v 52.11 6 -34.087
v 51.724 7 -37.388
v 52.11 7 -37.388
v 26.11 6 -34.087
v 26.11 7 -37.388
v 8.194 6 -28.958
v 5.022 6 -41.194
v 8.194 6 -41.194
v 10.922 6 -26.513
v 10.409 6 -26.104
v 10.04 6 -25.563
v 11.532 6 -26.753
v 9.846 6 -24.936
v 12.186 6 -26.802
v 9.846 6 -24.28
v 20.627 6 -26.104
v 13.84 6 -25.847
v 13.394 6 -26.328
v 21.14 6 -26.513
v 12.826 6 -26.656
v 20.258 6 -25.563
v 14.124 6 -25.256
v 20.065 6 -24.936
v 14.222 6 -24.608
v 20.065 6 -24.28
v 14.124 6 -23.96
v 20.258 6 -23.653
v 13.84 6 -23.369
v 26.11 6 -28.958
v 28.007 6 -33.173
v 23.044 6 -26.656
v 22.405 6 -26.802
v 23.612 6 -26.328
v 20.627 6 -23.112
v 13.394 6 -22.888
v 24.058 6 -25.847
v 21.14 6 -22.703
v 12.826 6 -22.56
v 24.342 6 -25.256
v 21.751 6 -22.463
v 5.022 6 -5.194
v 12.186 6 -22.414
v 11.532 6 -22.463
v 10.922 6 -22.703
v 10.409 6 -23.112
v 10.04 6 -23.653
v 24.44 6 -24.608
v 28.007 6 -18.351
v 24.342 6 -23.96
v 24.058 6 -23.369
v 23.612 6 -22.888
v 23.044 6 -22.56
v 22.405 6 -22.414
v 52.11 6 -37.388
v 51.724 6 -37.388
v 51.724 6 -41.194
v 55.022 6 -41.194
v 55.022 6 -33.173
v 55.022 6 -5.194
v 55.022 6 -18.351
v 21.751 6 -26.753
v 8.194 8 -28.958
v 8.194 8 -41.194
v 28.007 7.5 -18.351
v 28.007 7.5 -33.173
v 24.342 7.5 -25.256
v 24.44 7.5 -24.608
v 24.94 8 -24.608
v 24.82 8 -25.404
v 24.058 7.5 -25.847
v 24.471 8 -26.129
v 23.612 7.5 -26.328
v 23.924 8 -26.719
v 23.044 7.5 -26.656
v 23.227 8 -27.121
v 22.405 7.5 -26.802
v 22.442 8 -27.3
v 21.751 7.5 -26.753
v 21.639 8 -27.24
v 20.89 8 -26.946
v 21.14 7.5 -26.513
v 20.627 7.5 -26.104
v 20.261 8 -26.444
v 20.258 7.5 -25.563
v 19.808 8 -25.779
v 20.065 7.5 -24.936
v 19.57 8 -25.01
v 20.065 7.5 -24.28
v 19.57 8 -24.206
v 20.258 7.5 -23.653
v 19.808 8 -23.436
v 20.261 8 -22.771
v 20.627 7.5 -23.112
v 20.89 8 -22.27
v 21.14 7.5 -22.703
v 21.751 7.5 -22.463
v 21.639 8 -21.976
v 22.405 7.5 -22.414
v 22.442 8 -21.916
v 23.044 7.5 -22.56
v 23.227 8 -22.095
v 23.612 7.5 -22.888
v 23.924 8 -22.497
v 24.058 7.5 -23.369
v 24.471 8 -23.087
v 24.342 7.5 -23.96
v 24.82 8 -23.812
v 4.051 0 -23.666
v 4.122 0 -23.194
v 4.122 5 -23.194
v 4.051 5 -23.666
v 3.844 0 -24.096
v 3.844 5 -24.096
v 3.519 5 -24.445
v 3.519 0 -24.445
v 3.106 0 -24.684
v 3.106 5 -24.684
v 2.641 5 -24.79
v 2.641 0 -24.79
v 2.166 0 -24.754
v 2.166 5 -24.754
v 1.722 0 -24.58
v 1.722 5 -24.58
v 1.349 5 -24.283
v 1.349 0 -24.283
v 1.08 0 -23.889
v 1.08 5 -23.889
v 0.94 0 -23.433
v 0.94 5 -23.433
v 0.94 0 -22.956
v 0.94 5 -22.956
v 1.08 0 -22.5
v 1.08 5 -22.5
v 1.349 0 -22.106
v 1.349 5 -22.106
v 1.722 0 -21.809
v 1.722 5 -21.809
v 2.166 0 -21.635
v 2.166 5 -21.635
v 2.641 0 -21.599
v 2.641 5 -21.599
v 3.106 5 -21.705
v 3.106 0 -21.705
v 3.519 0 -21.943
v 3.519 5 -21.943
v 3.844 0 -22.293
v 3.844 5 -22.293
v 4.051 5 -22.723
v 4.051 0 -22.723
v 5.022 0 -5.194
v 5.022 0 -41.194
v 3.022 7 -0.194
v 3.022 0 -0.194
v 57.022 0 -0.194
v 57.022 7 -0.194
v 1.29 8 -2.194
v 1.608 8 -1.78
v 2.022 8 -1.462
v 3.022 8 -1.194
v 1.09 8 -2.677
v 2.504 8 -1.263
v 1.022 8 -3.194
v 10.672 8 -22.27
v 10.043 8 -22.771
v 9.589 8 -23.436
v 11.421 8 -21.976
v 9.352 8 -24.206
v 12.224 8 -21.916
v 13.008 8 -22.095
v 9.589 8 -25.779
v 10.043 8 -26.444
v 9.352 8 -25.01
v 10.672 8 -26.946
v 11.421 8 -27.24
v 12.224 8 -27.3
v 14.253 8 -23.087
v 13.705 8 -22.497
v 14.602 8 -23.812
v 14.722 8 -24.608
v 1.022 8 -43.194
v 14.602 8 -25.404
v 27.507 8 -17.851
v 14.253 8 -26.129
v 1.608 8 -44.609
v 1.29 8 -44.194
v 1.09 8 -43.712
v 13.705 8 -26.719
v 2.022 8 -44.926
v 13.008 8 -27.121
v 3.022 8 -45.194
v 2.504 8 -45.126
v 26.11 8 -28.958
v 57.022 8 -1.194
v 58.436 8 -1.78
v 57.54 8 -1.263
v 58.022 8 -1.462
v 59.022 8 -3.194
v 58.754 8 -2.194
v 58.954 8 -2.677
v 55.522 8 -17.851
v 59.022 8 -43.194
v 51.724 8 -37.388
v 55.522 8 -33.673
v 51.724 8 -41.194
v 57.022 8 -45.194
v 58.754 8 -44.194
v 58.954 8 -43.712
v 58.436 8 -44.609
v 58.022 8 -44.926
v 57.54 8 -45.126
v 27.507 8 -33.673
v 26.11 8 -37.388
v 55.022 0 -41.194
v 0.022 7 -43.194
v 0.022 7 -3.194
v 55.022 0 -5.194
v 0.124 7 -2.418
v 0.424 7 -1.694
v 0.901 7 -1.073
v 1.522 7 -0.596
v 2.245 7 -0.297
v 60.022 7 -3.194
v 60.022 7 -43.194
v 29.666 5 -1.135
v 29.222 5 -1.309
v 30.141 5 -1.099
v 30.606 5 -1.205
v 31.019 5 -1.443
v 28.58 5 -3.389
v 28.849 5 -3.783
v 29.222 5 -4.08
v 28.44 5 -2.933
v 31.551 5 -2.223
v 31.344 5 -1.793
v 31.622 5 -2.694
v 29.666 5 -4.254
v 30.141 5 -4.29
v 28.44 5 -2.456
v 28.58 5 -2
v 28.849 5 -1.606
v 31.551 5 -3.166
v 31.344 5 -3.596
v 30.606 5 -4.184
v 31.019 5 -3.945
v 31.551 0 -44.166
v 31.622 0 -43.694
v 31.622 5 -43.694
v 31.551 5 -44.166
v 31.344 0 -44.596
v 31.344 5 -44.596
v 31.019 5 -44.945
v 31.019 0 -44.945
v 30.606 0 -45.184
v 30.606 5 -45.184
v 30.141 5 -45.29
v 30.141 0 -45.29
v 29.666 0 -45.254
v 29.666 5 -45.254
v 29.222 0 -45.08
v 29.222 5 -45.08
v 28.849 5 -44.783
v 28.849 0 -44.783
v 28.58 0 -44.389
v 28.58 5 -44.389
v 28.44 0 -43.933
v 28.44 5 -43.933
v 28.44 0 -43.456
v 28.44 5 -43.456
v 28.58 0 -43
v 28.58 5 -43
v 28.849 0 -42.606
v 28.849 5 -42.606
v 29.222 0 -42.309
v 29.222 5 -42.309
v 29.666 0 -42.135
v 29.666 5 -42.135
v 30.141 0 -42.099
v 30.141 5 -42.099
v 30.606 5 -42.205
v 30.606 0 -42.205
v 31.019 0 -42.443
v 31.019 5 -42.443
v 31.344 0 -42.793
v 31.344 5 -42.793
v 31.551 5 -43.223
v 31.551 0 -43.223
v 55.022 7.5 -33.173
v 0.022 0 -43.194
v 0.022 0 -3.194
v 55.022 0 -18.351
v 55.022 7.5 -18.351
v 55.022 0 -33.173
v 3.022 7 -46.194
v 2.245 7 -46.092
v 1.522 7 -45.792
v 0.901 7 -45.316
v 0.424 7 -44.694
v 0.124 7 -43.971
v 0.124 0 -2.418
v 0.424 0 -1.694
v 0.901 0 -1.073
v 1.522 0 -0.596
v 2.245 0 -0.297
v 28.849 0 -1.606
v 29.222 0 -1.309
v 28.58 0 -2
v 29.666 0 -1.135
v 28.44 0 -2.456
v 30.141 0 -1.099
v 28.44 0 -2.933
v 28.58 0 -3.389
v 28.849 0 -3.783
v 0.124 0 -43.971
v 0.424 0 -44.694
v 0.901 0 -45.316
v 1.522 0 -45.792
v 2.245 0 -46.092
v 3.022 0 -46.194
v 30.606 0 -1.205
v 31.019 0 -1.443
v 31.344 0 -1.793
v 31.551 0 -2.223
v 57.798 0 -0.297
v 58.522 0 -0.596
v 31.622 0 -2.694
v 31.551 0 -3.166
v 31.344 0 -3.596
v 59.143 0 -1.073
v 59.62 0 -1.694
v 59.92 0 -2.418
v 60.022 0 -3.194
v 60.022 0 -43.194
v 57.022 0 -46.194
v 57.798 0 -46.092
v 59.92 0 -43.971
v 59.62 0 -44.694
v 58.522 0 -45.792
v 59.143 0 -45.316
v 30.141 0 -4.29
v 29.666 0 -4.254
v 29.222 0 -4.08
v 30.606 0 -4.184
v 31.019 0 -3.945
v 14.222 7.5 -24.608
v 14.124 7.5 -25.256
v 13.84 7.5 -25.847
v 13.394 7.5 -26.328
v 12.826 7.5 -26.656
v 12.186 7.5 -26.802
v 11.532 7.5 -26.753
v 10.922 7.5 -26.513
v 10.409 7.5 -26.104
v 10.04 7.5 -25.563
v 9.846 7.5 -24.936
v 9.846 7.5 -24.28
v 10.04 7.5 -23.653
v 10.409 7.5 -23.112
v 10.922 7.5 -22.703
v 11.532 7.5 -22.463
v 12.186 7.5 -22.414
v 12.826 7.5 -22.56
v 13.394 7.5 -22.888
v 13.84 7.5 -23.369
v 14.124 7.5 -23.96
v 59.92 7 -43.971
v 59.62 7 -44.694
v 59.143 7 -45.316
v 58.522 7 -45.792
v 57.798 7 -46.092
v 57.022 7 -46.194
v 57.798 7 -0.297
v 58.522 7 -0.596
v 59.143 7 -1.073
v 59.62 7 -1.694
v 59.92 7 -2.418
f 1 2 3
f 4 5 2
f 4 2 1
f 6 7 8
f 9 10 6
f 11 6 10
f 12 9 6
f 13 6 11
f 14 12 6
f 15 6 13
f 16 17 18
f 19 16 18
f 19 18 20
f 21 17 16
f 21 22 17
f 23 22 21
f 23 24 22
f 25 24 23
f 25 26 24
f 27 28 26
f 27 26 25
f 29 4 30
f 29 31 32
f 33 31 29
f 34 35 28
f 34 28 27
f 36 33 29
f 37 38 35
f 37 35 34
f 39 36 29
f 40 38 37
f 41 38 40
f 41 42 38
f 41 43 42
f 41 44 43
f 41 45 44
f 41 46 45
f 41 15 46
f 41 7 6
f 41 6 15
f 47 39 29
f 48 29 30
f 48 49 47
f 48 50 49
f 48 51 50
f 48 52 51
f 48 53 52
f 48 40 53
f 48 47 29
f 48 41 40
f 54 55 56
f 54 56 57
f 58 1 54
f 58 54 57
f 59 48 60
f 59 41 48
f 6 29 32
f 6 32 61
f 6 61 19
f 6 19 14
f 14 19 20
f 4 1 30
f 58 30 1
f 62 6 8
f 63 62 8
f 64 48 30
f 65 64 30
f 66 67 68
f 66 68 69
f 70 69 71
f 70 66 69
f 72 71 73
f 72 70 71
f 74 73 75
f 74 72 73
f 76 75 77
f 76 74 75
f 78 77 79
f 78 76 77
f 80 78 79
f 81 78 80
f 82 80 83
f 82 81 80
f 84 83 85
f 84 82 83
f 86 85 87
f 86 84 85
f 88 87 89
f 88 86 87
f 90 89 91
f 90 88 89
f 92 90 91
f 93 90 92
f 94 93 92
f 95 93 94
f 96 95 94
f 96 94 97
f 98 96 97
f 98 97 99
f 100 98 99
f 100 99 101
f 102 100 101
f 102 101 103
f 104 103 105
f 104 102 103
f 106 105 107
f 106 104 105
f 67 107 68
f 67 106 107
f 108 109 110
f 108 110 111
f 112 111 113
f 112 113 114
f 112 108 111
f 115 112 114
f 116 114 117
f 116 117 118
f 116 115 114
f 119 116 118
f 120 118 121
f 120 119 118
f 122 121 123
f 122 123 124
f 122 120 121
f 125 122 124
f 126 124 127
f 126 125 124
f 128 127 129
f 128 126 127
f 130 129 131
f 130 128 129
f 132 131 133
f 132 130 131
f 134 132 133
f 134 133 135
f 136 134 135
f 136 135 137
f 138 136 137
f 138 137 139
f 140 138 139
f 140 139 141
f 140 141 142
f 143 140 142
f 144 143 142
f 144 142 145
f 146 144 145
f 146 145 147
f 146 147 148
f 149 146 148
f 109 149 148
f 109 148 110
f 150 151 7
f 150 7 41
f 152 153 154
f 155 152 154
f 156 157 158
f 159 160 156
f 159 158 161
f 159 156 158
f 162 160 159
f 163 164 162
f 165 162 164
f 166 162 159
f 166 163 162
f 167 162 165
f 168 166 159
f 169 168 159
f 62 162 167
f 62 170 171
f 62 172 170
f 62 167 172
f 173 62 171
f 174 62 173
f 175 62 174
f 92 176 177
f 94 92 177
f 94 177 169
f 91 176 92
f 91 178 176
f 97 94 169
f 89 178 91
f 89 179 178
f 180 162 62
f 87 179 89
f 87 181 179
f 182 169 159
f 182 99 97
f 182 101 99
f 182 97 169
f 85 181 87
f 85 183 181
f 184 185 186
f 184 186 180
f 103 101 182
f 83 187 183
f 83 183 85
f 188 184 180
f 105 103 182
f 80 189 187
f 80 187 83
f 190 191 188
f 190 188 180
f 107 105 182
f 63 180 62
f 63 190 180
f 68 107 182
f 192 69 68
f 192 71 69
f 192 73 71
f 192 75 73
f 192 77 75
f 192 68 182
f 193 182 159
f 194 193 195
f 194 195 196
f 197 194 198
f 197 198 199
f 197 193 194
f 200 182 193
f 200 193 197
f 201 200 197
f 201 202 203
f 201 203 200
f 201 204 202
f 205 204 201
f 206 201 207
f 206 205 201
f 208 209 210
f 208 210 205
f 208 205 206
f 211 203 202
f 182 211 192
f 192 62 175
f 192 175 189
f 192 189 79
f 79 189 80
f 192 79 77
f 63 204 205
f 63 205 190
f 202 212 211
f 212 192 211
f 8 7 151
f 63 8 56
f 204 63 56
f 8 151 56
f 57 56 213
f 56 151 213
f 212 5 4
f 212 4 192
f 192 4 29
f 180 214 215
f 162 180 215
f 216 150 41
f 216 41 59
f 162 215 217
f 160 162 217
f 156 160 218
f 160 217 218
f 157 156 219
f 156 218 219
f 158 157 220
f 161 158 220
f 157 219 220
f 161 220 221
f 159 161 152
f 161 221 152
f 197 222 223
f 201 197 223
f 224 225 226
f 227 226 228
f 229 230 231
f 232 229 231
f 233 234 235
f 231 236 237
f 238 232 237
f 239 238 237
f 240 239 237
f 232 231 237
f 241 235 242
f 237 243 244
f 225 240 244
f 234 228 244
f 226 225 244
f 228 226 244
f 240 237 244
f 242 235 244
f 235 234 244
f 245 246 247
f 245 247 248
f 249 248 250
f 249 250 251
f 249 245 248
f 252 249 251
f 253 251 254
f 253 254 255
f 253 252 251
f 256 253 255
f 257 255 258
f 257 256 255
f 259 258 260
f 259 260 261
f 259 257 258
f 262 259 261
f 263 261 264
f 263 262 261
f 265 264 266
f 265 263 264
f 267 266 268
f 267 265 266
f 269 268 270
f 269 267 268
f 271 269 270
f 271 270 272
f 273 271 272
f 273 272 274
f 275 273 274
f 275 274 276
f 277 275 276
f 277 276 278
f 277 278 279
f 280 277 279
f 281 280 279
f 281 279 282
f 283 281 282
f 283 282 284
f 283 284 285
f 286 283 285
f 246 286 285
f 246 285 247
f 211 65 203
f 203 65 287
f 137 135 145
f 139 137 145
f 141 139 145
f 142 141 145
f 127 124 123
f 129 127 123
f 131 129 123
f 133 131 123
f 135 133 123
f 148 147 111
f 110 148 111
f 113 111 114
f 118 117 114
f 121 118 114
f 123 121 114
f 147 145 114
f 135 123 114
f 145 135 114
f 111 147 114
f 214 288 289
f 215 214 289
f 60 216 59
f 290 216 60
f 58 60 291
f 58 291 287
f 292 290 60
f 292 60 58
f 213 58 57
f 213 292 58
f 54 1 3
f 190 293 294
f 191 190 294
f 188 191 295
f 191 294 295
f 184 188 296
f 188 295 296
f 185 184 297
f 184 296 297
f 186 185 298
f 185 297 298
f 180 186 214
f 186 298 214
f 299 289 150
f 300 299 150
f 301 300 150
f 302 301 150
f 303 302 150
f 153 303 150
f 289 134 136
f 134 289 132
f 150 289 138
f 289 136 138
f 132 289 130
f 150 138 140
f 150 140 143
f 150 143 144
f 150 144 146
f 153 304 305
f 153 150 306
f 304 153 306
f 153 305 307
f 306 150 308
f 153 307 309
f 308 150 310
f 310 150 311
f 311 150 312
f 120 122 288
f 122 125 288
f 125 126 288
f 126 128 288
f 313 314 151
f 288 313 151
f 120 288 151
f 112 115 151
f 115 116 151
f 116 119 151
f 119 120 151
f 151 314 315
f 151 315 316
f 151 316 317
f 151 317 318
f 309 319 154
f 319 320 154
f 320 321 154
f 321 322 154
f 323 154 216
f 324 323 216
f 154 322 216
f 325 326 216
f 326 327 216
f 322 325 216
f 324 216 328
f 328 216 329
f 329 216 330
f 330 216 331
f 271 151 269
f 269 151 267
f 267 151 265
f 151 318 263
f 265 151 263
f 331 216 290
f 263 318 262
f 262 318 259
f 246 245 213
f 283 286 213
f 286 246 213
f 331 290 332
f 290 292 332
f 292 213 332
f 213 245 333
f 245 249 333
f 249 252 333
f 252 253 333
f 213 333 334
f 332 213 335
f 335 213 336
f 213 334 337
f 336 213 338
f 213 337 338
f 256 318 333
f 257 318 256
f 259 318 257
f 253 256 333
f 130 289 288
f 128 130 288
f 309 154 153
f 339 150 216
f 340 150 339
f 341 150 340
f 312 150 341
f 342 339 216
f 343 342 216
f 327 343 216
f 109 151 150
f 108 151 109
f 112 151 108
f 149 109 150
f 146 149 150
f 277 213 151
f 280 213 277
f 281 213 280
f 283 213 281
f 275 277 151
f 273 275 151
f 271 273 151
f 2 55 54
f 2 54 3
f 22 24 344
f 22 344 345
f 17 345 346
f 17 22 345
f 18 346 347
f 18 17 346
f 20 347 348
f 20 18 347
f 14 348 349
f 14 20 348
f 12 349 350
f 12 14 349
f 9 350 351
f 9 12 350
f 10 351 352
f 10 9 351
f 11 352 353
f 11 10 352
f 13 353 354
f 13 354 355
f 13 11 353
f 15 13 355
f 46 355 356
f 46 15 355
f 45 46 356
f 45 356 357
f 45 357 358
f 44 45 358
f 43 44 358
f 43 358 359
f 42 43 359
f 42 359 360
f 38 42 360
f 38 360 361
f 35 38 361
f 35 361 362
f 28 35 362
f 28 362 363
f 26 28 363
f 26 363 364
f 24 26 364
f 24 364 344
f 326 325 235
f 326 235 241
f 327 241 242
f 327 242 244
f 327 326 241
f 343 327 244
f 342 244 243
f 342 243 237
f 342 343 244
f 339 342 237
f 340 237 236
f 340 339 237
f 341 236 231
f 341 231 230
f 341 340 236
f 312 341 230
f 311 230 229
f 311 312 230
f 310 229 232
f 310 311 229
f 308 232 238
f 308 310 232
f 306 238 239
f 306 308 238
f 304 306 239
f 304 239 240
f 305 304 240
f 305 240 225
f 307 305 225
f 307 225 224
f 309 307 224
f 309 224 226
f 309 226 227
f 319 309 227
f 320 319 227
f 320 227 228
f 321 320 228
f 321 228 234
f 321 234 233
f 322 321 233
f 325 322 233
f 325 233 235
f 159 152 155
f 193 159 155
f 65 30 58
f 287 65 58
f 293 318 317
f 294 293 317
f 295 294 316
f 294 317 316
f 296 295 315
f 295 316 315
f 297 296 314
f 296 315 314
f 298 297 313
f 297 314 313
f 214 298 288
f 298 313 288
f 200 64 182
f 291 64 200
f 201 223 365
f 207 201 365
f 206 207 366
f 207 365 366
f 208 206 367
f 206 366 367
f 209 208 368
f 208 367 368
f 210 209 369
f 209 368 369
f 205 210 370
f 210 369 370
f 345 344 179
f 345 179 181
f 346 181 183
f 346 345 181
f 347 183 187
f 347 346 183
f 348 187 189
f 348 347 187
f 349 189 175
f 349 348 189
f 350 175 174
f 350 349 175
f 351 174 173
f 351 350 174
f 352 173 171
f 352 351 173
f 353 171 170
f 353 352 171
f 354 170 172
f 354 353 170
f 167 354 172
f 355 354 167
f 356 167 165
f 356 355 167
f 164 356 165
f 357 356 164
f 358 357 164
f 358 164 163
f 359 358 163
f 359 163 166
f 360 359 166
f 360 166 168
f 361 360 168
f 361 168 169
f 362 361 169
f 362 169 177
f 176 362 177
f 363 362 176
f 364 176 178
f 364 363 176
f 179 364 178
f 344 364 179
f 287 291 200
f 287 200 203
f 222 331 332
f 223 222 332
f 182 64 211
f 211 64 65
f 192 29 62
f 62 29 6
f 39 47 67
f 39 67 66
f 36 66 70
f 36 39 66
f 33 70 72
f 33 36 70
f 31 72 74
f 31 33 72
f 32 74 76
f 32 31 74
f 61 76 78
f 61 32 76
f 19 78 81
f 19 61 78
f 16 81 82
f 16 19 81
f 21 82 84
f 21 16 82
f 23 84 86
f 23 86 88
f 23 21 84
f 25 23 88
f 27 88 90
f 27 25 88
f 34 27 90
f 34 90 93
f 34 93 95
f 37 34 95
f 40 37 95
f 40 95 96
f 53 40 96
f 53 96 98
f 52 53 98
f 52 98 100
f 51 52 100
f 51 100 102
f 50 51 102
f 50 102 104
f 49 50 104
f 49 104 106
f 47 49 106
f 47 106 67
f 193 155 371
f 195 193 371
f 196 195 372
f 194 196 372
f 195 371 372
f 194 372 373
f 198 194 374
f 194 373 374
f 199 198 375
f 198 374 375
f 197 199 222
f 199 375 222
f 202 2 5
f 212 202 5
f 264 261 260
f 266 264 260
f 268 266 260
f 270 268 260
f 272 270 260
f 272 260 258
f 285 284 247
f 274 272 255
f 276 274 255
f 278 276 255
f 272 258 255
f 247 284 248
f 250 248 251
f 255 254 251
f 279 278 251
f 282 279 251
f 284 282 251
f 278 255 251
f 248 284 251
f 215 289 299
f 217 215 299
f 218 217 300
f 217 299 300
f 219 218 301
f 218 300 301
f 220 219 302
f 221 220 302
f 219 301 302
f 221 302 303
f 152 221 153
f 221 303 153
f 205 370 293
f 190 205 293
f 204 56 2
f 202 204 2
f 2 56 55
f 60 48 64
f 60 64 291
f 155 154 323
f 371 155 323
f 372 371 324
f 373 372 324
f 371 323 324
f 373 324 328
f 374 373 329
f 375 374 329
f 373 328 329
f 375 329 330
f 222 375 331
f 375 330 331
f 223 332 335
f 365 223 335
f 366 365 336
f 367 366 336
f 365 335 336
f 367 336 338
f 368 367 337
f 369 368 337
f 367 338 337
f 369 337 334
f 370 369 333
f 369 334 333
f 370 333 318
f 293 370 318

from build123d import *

# Parameters (mm, degrees)
SKETCH8_R           = 1.6
SKETCH8_W           = 27.014473095
SKETCH8_H           = 14.822230288
SKETCH8_R_2         = 2.2
BOSS_EXTRUDE4_DEPTH = 8
SKETCH13_R          = 1.6
BOSS_EXTRUDE5_DEPTH = 3
CHAMFER1_SIZE       = 1
CHAMFER2_SIZE       = 0.5
CHAMFER3_SIZE       = 0.5
SKETCH14_W          = 50
SKETCH14_H          = 36
CUT_EXTRUDE1_DEPTH  = 6
CUT_EXTRUDE2_DEPTH  = 26


with BuildPart() as part:
    # Sketch8 → Boss-Extrude4 (new body)
    with BuildSketch(Plane(origin=(0, 0, 0), x_dir=(1, 0, 0), z_dir=(0, 1, 0))):
        with BuildLine():
            Line((57.021874501, 46.194423092), (3.021874501, 46.194423092))
            ThreePointArc((3.021874501, 46.194423092), (0.900554158, 45.315743435), (0.021874501, 43.194423092))
            Line((0.021874501, 43.194423092), (0.021874501, 3.194423092))
            ThreePointArc((0.021874501, 3.194423092), (0.900554158, 1.073102748), (3.021874501, 0.194423092))
            Line((3.021874501, 0.194423092), (57.021874501, 0.194423092))
            ThreePointArc((57.021874501, 0.194423092), (59.143194845, 1.073102748), (60.021874501, 3.194423092))
            Line((60.021874501, 3.194423092), (60.021874501, 43.194423092))
            ThreePointArc((60.021874501, 43.194423092), (59.143194845, 45.315743435), (57.021874501, 46.194423092))
        make_face()
        with Locations((30.021874501, 2.694423092)):
            Circle(SKETCH8_R, mode=Mode.SUBTRACT)
        with Locations((2.521874501, 23.194423092)):
            Circle(SKETCH8_R, mode=Mode.SUBTRACT)
        with Locations((30.021874501, 43.694423092)):
            Circle(SKETCH8_R, mode=Mode.SUBTRACT)
        Polygon((8.193945871, 28.957965299), (8.193945871, 41.194423092), (51.724223397, 41.194423092), (51.724223397, 37.388033247), (26.110307843, 37.388033247), (26.110307843, 28.957965299), align=None, mode=Mode.SUBTRACT)
        with Locations((41.514637954, 25.761884129)):
            Rectangle(SKETCH8_W, SKETCH8_H, mode=Mode.SUBTRACT)
        with Locations((22.240201254, 24.607965299)):
            Circle(SKETCH8_R_2, mode=Mode.SUBTRACT)
        with Locations((12.021874501, 24.607965299)):
            Circle(SKETCH8_R_2, mode=Mode.SUBTRACT)
    extrude(amount=BOSS_EXTRUDE4_DEPTH)

    # Sketch13 → Boss-Extrude5 (add)
    with BuildSketch(Plane(origin=(0, 8, 0), x_dir=(1, 0, 0), z_dir=(0, 1, 0))):
        with Locations((2.521874501, 23.194423092)):
            Circle(SKETCH13_R)
        with Locations((30.021874501, 2.694423092)):
            Circle(SKETCH13_R)
        with Locations((30.021874501, 43.694423092)):
            Circle(SKETCH13_R)
    extrude(amount=-BOSS_EXTRUDE5_DEPTH)

    # Chamfer1
    chamfer1_edges = [part.edges().sort_by_distance(p)[0] for p in [
        (59.143194845, 8, -1.073102748),
        (60.021874501, 8, -23.194423092),
        (59.143194845, 8, -45.315743435),
        (30.021874501, 8, -46.194423092),
        (0.900554158, 8, -45.315743435),
        (0.021874501, 8, -23.194423092),
        (0.900554158, 8, -1.073102748),
        (30.021874501, 8, -0.194423092),
    ]]
    chamfer(chamfer1_edges, length=CHAMFER1_SIZE)

    # Chamfer2
    chamfer2_edges = [part.edges().sort_by_distance(p)[0] for p in [
        (41.514637954, 8, -33.172999273),
        (55.021874501, 8, -25.761884129),
        (41.514637954, 8, -18.350768985),
        (28.007401406, 8, -25.761884129),
    ]]
    chamfer(chamfer2_edges, length=CHAMFER2_SIZE)

    # Chamfer3
    chamfer3_edges = [part.edges().sort_by_distance(p)[0] for p in [
        (20.040201254, 8, -24.607965299),
        (9.821874501, 8, -24.607965299),
    ]]
    chamfer(chamfer3_edges, length=CHAMFER3_SIZE)

    # Sketch14 → Cut-Extrude1 (cut)
    with BuildSketch(Plane.XZ):
        with Locations((30.021874501, -23.194423092)):
            Rectangle(SKETCH14_W, SKETCH14_H)
    extrude(amount=-CUT_EXTRUDE1_DEPTH, mode=Mode.SUBTRACT)

    # Sketch15 → Cut-Extrude2 (cut)
    with BuildSketch(Plane.ZY.offset(-26.110307843)):
        Polygon((-37.388033247, 7), (-34.086693064, 6), (-37.388033247, 6), align=None)
    extrude(amount=-CUT_EXTRUDE2_DEPTH, mode=Mode.SUBTRACT)


solid = part.part
